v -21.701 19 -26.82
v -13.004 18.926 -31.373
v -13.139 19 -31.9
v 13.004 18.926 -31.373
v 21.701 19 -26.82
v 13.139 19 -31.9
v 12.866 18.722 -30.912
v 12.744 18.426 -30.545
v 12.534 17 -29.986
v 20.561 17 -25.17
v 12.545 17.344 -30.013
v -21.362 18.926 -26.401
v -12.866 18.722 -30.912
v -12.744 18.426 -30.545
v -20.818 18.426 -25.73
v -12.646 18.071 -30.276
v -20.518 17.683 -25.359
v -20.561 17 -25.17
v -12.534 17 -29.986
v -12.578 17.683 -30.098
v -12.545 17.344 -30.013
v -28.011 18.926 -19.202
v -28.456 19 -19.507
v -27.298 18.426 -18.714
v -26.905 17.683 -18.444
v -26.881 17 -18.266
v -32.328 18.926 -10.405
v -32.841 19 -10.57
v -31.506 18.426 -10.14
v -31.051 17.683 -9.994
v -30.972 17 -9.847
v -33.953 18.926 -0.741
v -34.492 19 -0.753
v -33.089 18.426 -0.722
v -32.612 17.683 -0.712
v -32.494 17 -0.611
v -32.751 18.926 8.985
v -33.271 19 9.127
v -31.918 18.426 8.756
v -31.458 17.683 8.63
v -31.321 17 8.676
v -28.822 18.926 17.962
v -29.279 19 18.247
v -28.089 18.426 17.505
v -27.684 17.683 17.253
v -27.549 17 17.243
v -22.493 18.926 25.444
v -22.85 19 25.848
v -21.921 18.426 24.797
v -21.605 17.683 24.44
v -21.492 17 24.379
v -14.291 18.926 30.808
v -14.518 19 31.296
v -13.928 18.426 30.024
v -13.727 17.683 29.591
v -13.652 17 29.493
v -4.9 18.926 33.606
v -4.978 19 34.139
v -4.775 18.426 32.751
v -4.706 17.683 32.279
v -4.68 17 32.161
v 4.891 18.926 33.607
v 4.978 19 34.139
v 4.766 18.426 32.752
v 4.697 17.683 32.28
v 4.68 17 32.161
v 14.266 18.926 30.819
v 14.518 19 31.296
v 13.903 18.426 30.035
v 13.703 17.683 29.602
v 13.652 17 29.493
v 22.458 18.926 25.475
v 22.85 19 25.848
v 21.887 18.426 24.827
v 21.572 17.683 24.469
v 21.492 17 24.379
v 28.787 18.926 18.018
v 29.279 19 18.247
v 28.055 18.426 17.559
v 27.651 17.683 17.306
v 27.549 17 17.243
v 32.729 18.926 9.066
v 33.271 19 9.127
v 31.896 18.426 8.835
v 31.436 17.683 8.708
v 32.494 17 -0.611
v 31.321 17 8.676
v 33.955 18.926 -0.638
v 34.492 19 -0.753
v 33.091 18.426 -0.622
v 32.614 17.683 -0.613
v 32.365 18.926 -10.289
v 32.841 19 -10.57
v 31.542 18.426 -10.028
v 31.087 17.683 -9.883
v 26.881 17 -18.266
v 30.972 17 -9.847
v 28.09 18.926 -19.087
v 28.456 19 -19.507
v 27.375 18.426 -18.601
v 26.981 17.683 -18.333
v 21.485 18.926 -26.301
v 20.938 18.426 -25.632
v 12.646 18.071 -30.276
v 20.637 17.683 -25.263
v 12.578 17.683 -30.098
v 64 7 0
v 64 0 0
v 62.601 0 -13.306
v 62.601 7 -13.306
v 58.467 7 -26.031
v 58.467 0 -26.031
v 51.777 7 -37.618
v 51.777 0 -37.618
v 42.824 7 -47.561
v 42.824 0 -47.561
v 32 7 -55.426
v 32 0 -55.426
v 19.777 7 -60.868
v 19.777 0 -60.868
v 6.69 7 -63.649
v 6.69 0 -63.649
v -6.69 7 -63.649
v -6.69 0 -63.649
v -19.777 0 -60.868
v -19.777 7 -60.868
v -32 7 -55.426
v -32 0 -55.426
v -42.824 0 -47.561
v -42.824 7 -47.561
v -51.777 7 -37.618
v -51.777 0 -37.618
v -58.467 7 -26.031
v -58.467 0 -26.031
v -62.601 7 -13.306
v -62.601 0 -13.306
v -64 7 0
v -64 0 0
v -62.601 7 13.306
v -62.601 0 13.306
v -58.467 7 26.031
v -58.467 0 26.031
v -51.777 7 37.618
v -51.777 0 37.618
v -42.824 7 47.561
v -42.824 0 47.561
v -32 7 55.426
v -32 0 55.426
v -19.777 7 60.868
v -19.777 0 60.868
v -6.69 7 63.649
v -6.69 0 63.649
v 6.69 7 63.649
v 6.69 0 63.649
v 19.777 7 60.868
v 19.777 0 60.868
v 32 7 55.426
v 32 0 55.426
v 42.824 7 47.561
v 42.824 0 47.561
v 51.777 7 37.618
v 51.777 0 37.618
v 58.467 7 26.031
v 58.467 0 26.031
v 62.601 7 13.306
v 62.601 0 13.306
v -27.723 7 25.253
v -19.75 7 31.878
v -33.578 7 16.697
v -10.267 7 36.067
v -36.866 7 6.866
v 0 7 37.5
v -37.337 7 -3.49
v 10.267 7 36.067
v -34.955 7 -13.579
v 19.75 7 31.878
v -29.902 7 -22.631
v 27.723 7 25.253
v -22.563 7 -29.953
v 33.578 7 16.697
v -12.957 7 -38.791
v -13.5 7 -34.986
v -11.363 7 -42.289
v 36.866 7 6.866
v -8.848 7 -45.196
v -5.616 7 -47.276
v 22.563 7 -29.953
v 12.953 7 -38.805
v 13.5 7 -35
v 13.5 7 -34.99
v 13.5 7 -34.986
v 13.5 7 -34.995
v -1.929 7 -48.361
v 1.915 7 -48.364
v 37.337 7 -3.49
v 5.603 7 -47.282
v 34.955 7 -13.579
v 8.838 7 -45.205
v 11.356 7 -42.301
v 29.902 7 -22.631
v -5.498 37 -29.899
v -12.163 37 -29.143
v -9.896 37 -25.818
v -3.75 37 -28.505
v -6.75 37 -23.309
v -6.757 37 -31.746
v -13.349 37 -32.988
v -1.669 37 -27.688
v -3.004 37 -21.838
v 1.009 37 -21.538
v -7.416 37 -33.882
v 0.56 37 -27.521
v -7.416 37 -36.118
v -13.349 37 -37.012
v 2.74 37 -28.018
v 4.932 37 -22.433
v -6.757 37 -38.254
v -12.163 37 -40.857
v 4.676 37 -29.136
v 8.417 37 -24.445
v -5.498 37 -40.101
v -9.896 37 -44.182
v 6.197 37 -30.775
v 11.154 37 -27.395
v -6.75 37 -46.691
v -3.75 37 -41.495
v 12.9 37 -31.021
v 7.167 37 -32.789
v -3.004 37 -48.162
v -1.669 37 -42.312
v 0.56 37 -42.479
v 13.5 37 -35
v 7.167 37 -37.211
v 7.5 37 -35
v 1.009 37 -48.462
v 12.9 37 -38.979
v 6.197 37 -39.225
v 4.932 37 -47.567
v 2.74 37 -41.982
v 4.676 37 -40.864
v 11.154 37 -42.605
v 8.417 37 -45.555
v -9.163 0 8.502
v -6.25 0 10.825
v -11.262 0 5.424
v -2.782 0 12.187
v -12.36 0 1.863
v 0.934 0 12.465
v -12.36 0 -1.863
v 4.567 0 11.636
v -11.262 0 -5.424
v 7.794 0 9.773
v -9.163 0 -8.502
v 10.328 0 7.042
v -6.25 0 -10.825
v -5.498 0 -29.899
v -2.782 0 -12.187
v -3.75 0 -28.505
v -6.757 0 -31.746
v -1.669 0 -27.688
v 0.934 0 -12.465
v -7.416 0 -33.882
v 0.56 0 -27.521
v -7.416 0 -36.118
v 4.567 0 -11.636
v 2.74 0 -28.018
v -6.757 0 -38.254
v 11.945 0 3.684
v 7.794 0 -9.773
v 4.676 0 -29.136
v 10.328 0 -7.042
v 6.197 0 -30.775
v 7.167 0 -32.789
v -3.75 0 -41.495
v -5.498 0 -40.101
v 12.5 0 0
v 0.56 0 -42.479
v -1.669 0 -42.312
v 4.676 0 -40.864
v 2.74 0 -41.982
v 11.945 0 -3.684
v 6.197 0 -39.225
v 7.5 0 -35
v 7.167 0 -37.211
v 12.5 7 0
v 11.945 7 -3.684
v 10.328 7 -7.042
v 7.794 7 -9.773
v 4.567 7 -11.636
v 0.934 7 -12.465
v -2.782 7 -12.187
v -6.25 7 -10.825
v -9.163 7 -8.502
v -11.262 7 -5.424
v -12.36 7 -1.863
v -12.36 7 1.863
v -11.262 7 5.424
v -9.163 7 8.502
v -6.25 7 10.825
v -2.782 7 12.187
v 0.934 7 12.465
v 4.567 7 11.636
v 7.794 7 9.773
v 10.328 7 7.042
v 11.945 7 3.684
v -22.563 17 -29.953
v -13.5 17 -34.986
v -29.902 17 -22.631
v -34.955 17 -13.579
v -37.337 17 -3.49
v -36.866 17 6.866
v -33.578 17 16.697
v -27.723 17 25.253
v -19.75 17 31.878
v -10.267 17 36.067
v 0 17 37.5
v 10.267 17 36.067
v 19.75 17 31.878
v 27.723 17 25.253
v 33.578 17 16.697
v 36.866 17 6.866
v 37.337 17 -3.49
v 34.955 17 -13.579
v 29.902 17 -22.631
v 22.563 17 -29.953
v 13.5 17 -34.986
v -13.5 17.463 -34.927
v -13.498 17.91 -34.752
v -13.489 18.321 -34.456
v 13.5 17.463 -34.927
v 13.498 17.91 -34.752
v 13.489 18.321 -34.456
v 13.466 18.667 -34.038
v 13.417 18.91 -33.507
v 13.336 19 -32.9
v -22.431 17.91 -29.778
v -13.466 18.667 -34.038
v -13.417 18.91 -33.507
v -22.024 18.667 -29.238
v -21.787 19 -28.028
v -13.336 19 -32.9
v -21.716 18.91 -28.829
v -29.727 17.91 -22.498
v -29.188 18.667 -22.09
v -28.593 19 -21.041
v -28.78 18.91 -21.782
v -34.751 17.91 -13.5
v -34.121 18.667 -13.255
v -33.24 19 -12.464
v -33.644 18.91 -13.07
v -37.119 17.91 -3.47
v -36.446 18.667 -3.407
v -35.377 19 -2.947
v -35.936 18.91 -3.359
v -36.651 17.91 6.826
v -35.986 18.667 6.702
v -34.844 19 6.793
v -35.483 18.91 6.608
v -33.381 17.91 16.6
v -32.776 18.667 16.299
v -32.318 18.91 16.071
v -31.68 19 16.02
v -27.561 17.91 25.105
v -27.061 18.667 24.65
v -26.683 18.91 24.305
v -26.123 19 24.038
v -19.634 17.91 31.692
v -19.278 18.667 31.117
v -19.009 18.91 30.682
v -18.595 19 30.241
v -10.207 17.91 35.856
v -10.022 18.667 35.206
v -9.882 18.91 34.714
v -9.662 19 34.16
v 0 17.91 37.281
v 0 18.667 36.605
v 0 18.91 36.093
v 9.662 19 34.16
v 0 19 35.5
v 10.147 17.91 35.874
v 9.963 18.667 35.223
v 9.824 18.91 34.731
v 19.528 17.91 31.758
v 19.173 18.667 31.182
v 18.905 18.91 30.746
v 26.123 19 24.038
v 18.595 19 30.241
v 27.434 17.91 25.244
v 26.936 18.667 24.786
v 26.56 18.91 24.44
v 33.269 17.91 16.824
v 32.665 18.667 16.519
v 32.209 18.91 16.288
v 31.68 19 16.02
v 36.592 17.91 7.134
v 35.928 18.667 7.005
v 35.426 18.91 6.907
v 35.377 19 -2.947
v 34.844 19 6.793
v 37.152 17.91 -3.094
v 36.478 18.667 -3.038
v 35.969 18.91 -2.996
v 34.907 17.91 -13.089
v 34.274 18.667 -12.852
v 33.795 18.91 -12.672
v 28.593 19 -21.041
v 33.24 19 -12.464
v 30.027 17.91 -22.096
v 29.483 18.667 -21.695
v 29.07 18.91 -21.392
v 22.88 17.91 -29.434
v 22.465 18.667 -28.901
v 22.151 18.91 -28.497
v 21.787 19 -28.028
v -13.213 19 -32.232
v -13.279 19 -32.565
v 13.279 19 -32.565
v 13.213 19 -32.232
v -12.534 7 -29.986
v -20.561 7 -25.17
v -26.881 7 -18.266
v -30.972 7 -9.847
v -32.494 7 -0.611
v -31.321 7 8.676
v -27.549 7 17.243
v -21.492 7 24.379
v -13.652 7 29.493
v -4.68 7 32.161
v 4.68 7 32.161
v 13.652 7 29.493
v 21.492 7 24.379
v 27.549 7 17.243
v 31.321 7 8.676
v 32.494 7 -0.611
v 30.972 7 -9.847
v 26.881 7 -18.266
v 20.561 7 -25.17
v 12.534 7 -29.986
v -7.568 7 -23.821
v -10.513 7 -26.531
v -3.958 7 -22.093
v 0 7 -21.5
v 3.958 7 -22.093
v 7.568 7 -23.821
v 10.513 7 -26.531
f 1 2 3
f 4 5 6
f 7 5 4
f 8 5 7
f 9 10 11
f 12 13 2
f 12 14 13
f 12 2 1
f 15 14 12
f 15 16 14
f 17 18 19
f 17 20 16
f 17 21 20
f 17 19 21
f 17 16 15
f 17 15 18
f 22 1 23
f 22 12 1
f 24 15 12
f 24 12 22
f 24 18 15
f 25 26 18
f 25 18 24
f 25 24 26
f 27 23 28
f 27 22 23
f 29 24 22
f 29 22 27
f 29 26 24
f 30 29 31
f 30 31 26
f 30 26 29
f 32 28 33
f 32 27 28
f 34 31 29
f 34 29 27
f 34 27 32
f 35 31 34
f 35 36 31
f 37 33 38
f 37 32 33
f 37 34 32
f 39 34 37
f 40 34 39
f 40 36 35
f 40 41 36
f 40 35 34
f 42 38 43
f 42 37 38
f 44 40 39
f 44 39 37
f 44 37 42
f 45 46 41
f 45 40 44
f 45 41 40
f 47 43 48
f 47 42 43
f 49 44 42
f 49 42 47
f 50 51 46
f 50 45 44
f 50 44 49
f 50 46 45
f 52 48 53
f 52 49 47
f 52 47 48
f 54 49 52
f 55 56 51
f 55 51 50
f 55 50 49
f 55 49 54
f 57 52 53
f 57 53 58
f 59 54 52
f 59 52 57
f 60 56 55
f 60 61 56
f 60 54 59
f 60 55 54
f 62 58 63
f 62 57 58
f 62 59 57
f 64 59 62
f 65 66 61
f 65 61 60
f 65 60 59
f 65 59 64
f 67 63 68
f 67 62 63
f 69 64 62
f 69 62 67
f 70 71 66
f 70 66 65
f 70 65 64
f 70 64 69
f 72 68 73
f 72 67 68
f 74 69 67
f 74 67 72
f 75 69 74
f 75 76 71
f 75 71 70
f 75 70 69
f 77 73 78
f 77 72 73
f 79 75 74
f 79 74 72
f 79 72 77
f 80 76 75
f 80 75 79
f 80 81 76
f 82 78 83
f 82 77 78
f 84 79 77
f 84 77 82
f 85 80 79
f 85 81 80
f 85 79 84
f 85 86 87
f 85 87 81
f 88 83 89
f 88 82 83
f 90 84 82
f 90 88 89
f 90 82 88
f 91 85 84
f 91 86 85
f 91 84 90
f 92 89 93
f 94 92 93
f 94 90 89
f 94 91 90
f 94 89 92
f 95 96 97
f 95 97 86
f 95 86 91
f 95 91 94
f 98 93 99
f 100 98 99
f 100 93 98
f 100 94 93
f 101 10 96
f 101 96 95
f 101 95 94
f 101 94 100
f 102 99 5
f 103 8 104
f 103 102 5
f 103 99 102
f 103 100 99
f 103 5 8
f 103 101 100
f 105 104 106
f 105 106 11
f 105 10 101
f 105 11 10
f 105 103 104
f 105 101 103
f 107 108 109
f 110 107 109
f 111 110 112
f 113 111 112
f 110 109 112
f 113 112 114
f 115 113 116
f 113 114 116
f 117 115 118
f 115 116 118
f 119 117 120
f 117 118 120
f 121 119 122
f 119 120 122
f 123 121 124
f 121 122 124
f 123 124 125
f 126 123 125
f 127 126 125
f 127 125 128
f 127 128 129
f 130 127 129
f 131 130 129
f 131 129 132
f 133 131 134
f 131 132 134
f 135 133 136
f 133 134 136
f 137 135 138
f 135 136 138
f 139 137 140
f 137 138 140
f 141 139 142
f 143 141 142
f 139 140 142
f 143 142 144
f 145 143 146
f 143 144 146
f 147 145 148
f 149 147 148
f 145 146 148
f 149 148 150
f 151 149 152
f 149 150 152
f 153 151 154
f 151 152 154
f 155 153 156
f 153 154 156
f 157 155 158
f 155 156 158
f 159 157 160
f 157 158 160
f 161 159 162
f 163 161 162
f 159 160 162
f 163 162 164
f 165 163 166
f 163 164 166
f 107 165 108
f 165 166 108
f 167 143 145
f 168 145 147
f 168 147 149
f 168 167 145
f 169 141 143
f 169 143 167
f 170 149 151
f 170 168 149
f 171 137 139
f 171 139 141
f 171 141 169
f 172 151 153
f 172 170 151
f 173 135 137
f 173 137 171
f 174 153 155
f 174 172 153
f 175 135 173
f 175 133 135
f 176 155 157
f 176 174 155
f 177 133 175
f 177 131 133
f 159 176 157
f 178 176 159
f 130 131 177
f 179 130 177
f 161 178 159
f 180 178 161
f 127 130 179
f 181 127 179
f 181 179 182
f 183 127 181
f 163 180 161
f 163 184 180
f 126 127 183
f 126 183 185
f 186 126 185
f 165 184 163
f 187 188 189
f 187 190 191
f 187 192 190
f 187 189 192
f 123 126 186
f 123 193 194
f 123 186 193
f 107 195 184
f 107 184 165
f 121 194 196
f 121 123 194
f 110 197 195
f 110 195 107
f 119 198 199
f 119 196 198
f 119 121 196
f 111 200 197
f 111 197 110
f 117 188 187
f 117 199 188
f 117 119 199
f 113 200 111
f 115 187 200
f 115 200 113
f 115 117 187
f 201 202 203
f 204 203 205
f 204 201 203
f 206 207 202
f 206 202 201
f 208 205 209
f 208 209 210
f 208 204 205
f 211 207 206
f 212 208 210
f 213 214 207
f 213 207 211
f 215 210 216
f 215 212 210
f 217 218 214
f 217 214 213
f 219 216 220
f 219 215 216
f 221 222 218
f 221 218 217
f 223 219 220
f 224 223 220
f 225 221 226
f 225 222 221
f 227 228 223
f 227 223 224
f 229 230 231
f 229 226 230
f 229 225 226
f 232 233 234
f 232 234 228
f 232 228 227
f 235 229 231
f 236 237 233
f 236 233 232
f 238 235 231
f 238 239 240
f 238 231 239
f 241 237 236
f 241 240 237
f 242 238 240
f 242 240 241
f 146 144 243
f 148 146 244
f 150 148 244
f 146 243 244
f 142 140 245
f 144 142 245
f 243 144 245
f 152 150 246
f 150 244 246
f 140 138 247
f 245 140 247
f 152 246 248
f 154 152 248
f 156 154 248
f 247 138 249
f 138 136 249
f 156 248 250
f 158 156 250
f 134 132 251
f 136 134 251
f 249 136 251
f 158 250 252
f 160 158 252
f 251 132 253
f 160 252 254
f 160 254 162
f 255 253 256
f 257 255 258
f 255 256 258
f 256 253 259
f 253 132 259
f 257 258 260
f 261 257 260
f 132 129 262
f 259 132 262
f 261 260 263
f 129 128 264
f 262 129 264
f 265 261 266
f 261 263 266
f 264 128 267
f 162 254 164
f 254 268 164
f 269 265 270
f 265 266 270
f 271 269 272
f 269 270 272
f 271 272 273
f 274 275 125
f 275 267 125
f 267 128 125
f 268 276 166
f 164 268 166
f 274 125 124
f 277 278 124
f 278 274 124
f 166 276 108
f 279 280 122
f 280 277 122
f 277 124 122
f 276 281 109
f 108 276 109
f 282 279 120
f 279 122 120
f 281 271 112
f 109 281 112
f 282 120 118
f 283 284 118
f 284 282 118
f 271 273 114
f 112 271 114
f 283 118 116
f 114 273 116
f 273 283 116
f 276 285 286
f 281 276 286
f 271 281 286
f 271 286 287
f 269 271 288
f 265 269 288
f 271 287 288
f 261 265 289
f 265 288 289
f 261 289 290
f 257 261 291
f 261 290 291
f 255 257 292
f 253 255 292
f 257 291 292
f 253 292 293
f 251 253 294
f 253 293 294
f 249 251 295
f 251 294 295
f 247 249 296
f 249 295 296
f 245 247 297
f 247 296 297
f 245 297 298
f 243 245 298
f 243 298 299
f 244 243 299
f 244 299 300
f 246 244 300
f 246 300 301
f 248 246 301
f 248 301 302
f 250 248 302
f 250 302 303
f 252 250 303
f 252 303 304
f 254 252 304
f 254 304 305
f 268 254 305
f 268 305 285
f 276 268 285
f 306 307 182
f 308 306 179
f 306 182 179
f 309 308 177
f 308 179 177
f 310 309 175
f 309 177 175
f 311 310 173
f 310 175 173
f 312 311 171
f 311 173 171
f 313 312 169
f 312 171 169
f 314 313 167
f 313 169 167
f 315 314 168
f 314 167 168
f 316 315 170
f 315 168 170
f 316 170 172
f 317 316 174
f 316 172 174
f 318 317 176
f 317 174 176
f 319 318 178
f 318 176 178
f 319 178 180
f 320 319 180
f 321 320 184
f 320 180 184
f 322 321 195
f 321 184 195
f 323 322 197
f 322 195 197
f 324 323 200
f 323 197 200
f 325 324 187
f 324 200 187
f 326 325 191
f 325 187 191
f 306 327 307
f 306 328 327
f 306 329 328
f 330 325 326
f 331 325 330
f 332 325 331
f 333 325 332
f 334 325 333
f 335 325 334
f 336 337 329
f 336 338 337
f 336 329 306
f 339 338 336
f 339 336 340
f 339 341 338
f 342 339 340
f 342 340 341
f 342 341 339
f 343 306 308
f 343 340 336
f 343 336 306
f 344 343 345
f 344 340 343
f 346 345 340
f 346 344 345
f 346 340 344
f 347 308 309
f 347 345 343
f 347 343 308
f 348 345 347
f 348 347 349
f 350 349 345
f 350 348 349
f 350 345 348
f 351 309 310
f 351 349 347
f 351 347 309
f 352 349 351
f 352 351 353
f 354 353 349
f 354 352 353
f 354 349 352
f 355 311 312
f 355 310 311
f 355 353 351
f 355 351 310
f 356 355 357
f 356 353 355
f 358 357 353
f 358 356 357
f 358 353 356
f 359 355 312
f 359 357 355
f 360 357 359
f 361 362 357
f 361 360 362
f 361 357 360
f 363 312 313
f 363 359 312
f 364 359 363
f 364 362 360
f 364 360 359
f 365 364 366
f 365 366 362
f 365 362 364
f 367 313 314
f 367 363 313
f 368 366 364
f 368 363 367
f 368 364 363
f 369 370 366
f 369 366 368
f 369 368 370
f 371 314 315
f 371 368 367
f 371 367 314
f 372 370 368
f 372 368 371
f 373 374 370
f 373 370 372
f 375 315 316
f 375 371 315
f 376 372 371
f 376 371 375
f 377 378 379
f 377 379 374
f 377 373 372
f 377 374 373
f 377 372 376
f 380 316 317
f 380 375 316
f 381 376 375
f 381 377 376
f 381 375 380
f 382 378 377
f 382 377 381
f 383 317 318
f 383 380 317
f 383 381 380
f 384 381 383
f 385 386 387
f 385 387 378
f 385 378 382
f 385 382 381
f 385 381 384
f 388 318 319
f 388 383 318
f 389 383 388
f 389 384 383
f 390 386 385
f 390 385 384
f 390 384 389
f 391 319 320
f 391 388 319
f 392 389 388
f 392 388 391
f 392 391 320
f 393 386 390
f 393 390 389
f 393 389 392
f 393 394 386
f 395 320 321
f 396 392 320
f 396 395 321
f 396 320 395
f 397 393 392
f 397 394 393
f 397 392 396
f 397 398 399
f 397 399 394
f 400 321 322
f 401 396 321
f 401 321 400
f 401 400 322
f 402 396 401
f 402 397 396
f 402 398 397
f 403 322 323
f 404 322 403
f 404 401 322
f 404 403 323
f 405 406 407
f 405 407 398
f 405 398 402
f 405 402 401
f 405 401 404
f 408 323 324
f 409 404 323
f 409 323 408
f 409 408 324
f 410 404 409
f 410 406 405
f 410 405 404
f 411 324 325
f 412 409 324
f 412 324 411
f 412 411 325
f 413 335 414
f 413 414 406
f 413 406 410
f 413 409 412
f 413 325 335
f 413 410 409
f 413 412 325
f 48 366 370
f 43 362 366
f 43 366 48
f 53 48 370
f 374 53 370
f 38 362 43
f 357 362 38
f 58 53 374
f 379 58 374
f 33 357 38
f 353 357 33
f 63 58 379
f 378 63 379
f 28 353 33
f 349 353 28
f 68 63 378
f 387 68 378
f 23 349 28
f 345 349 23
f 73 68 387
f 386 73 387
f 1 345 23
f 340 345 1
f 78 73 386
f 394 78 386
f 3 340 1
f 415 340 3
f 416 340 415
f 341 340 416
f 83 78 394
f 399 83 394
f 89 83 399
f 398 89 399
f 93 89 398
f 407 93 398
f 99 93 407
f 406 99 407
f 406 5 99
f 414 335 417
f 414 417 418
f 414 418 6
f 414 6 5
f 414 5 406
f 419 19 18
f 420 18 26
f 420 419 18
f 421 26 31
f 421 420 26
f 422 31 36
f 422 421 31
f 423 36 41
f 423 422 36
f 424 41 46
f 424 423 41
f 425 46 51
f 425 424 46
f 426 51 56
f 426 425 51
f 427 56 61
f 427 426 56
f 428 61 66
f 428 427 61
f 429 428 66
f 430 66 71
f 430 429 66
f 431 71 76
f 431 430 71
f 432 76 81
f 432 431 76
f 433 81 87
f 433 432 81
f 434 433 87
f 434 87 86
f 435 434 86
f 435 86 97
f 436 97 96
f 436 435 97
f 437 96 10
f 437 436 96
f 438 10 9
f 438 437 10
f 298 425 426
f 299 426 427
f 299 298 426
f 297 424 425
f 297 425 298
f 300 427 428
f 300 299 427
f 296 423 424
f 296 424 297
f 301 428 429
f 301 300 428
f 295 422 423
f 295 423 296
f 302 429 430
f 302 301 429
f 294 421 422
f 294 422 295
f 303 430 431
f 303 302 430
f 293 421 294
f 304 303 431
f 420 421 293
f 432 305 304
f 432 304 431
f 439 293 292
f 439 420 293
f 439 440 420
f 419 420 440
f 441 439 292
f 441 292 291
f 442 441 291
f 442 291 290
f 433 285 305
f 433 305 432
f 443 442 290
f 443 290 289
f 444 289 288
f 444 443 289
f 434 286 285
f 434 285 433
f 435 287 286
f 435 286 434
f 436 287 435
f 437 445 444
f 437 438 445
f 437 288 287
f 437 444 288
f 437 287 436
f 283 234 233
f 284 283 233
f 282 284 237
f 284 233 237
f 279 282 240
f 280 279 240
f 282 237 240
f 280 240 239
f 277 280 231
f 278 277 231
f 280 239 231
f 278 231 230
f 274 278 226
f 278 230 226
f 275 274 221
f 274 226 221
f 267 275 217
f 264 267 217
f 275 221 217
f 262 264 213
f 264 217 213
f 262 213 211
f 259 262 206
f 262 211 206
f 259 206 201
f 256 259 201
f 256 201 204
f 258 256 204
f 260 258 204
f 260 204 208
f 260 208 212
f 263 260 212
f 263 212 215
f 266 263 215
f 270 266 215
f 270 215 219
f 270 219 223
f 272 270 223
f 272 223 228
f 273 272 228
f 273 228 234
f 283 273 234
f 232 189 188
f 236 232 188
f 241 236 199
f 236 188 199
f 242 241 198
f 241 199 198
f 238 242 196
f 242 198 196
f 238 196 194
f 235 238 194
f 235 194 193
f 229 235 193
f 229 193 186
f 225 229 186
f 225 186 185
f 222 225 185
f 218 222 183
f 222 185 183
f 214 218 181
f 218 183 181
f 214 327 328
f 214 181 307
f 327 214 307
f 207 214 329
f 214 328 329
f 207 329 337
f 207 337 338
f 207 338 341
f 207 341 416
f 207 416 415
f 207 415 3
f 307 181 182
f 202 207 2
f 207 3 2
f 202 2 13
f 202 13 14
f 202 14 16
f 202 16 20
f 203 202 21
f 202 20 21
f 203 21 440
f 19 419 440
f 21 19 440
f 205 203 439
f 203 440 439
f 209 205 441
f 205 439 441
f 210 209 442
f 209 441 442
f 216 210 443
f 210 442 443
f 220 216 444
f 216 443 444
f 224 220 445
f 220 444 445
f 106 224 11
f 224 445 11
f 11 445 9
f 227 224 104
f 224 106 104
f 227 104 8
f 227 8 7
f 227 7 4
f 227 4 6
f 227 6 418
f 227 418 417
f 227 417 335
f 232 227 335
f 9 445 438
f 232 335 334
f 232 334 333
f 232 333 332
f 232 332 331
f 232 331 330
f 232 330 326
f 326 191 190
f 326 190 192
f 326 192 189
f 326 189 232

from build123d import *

# Parameters (mm, degrees)
SKETCH2_R           = 64
BOSS_EXTRUDE1_DEPTH = 7
SKETCH3_R           = 37.5
SKETCH3_R_2         = 32.5
BOSS_EXTRUDE2_DEPTH = 12
SKETCH4_R           = 12.5
CUT_EXTRUDE1_DEPTH  = 8
FILLET1_R           = 2
SKETCH5_R           = 13.5
BOSS_EXTRUDE3_DEPTH = 30
SKETCH7_R           = 7.5
CUT_EXTRUDE2_DEPTH  = 38


with BuildPart() as part:
    # Sketch2 → Boss-Extrude1 (new body)
    with BuildSketch(Plane(origin=(0, 0, 0), x_dir=(1, 0, 0), z_dir=(0, 1, 0))):
        Circle(SKETCH2_R)
    extrude(amount=BOSS_EXTRUDE1_DEPTH)

    # Sketch3 → Boss-Extrude2 (add)
    with BuildSketch(Plane(origin=(0, 7, 0), x_dir=(1, 0, 0), z_dir=(0, 1, 0))):
        Circle(SKETCH3_R)
        Circle(SKETCH3_R_2, mode=Mode.SUBTRACT)
    extrude(amount=BOSS_EXTRUDE2_DEPTH)

    # Sketch4 → Cut-Extrude1 (cut, through all)
    with BuildSketch(Plane(origin=(0, 7, 0), x_dir=(1, 0, 0), z_dir=(0, 1, 0))):
        Circle(SKETCH4_R)
    extrude(amount=-CUT_EXTRUDE1_DEPTH, mode=Mode.SUBTRACT)

    # Fillet1
    fillet1_edges = [part.edges().sort_by_distance(p)[0] for p in [
        (-37.5, 19, 0),
        (-32.5, 19, 0),
    ]]
    fillet(fillet1_edges, radius=FILLET1_R)

    # Sketch5 → Boss-Extrude3 (add)
    with BuildSketch(Plane(origin=(0, 7, 0), x_dir=(1, 0, 0), z_dir=(0, 1, 0))):
        with Locations((0, 35)):
            Circle(SKETCH5_R)
    extrude(amount=BOSS_EXTRUDE3_DEPTH)

    # Sketch7 → Cut-Extrude2 (cut, through all)
    with BuildSketch(Plane(origin=(0, 37, 0), x_dir=(1, 0, 0), z_dir=(0, 1, 0))):
        with Locations((0, 35)):
            Circle(SKETCH7_R)
    extrude(amount=-CUT_EXTRUDE2_DEPTH, mode=Mode.SUBTRACT)


solid = part.part
